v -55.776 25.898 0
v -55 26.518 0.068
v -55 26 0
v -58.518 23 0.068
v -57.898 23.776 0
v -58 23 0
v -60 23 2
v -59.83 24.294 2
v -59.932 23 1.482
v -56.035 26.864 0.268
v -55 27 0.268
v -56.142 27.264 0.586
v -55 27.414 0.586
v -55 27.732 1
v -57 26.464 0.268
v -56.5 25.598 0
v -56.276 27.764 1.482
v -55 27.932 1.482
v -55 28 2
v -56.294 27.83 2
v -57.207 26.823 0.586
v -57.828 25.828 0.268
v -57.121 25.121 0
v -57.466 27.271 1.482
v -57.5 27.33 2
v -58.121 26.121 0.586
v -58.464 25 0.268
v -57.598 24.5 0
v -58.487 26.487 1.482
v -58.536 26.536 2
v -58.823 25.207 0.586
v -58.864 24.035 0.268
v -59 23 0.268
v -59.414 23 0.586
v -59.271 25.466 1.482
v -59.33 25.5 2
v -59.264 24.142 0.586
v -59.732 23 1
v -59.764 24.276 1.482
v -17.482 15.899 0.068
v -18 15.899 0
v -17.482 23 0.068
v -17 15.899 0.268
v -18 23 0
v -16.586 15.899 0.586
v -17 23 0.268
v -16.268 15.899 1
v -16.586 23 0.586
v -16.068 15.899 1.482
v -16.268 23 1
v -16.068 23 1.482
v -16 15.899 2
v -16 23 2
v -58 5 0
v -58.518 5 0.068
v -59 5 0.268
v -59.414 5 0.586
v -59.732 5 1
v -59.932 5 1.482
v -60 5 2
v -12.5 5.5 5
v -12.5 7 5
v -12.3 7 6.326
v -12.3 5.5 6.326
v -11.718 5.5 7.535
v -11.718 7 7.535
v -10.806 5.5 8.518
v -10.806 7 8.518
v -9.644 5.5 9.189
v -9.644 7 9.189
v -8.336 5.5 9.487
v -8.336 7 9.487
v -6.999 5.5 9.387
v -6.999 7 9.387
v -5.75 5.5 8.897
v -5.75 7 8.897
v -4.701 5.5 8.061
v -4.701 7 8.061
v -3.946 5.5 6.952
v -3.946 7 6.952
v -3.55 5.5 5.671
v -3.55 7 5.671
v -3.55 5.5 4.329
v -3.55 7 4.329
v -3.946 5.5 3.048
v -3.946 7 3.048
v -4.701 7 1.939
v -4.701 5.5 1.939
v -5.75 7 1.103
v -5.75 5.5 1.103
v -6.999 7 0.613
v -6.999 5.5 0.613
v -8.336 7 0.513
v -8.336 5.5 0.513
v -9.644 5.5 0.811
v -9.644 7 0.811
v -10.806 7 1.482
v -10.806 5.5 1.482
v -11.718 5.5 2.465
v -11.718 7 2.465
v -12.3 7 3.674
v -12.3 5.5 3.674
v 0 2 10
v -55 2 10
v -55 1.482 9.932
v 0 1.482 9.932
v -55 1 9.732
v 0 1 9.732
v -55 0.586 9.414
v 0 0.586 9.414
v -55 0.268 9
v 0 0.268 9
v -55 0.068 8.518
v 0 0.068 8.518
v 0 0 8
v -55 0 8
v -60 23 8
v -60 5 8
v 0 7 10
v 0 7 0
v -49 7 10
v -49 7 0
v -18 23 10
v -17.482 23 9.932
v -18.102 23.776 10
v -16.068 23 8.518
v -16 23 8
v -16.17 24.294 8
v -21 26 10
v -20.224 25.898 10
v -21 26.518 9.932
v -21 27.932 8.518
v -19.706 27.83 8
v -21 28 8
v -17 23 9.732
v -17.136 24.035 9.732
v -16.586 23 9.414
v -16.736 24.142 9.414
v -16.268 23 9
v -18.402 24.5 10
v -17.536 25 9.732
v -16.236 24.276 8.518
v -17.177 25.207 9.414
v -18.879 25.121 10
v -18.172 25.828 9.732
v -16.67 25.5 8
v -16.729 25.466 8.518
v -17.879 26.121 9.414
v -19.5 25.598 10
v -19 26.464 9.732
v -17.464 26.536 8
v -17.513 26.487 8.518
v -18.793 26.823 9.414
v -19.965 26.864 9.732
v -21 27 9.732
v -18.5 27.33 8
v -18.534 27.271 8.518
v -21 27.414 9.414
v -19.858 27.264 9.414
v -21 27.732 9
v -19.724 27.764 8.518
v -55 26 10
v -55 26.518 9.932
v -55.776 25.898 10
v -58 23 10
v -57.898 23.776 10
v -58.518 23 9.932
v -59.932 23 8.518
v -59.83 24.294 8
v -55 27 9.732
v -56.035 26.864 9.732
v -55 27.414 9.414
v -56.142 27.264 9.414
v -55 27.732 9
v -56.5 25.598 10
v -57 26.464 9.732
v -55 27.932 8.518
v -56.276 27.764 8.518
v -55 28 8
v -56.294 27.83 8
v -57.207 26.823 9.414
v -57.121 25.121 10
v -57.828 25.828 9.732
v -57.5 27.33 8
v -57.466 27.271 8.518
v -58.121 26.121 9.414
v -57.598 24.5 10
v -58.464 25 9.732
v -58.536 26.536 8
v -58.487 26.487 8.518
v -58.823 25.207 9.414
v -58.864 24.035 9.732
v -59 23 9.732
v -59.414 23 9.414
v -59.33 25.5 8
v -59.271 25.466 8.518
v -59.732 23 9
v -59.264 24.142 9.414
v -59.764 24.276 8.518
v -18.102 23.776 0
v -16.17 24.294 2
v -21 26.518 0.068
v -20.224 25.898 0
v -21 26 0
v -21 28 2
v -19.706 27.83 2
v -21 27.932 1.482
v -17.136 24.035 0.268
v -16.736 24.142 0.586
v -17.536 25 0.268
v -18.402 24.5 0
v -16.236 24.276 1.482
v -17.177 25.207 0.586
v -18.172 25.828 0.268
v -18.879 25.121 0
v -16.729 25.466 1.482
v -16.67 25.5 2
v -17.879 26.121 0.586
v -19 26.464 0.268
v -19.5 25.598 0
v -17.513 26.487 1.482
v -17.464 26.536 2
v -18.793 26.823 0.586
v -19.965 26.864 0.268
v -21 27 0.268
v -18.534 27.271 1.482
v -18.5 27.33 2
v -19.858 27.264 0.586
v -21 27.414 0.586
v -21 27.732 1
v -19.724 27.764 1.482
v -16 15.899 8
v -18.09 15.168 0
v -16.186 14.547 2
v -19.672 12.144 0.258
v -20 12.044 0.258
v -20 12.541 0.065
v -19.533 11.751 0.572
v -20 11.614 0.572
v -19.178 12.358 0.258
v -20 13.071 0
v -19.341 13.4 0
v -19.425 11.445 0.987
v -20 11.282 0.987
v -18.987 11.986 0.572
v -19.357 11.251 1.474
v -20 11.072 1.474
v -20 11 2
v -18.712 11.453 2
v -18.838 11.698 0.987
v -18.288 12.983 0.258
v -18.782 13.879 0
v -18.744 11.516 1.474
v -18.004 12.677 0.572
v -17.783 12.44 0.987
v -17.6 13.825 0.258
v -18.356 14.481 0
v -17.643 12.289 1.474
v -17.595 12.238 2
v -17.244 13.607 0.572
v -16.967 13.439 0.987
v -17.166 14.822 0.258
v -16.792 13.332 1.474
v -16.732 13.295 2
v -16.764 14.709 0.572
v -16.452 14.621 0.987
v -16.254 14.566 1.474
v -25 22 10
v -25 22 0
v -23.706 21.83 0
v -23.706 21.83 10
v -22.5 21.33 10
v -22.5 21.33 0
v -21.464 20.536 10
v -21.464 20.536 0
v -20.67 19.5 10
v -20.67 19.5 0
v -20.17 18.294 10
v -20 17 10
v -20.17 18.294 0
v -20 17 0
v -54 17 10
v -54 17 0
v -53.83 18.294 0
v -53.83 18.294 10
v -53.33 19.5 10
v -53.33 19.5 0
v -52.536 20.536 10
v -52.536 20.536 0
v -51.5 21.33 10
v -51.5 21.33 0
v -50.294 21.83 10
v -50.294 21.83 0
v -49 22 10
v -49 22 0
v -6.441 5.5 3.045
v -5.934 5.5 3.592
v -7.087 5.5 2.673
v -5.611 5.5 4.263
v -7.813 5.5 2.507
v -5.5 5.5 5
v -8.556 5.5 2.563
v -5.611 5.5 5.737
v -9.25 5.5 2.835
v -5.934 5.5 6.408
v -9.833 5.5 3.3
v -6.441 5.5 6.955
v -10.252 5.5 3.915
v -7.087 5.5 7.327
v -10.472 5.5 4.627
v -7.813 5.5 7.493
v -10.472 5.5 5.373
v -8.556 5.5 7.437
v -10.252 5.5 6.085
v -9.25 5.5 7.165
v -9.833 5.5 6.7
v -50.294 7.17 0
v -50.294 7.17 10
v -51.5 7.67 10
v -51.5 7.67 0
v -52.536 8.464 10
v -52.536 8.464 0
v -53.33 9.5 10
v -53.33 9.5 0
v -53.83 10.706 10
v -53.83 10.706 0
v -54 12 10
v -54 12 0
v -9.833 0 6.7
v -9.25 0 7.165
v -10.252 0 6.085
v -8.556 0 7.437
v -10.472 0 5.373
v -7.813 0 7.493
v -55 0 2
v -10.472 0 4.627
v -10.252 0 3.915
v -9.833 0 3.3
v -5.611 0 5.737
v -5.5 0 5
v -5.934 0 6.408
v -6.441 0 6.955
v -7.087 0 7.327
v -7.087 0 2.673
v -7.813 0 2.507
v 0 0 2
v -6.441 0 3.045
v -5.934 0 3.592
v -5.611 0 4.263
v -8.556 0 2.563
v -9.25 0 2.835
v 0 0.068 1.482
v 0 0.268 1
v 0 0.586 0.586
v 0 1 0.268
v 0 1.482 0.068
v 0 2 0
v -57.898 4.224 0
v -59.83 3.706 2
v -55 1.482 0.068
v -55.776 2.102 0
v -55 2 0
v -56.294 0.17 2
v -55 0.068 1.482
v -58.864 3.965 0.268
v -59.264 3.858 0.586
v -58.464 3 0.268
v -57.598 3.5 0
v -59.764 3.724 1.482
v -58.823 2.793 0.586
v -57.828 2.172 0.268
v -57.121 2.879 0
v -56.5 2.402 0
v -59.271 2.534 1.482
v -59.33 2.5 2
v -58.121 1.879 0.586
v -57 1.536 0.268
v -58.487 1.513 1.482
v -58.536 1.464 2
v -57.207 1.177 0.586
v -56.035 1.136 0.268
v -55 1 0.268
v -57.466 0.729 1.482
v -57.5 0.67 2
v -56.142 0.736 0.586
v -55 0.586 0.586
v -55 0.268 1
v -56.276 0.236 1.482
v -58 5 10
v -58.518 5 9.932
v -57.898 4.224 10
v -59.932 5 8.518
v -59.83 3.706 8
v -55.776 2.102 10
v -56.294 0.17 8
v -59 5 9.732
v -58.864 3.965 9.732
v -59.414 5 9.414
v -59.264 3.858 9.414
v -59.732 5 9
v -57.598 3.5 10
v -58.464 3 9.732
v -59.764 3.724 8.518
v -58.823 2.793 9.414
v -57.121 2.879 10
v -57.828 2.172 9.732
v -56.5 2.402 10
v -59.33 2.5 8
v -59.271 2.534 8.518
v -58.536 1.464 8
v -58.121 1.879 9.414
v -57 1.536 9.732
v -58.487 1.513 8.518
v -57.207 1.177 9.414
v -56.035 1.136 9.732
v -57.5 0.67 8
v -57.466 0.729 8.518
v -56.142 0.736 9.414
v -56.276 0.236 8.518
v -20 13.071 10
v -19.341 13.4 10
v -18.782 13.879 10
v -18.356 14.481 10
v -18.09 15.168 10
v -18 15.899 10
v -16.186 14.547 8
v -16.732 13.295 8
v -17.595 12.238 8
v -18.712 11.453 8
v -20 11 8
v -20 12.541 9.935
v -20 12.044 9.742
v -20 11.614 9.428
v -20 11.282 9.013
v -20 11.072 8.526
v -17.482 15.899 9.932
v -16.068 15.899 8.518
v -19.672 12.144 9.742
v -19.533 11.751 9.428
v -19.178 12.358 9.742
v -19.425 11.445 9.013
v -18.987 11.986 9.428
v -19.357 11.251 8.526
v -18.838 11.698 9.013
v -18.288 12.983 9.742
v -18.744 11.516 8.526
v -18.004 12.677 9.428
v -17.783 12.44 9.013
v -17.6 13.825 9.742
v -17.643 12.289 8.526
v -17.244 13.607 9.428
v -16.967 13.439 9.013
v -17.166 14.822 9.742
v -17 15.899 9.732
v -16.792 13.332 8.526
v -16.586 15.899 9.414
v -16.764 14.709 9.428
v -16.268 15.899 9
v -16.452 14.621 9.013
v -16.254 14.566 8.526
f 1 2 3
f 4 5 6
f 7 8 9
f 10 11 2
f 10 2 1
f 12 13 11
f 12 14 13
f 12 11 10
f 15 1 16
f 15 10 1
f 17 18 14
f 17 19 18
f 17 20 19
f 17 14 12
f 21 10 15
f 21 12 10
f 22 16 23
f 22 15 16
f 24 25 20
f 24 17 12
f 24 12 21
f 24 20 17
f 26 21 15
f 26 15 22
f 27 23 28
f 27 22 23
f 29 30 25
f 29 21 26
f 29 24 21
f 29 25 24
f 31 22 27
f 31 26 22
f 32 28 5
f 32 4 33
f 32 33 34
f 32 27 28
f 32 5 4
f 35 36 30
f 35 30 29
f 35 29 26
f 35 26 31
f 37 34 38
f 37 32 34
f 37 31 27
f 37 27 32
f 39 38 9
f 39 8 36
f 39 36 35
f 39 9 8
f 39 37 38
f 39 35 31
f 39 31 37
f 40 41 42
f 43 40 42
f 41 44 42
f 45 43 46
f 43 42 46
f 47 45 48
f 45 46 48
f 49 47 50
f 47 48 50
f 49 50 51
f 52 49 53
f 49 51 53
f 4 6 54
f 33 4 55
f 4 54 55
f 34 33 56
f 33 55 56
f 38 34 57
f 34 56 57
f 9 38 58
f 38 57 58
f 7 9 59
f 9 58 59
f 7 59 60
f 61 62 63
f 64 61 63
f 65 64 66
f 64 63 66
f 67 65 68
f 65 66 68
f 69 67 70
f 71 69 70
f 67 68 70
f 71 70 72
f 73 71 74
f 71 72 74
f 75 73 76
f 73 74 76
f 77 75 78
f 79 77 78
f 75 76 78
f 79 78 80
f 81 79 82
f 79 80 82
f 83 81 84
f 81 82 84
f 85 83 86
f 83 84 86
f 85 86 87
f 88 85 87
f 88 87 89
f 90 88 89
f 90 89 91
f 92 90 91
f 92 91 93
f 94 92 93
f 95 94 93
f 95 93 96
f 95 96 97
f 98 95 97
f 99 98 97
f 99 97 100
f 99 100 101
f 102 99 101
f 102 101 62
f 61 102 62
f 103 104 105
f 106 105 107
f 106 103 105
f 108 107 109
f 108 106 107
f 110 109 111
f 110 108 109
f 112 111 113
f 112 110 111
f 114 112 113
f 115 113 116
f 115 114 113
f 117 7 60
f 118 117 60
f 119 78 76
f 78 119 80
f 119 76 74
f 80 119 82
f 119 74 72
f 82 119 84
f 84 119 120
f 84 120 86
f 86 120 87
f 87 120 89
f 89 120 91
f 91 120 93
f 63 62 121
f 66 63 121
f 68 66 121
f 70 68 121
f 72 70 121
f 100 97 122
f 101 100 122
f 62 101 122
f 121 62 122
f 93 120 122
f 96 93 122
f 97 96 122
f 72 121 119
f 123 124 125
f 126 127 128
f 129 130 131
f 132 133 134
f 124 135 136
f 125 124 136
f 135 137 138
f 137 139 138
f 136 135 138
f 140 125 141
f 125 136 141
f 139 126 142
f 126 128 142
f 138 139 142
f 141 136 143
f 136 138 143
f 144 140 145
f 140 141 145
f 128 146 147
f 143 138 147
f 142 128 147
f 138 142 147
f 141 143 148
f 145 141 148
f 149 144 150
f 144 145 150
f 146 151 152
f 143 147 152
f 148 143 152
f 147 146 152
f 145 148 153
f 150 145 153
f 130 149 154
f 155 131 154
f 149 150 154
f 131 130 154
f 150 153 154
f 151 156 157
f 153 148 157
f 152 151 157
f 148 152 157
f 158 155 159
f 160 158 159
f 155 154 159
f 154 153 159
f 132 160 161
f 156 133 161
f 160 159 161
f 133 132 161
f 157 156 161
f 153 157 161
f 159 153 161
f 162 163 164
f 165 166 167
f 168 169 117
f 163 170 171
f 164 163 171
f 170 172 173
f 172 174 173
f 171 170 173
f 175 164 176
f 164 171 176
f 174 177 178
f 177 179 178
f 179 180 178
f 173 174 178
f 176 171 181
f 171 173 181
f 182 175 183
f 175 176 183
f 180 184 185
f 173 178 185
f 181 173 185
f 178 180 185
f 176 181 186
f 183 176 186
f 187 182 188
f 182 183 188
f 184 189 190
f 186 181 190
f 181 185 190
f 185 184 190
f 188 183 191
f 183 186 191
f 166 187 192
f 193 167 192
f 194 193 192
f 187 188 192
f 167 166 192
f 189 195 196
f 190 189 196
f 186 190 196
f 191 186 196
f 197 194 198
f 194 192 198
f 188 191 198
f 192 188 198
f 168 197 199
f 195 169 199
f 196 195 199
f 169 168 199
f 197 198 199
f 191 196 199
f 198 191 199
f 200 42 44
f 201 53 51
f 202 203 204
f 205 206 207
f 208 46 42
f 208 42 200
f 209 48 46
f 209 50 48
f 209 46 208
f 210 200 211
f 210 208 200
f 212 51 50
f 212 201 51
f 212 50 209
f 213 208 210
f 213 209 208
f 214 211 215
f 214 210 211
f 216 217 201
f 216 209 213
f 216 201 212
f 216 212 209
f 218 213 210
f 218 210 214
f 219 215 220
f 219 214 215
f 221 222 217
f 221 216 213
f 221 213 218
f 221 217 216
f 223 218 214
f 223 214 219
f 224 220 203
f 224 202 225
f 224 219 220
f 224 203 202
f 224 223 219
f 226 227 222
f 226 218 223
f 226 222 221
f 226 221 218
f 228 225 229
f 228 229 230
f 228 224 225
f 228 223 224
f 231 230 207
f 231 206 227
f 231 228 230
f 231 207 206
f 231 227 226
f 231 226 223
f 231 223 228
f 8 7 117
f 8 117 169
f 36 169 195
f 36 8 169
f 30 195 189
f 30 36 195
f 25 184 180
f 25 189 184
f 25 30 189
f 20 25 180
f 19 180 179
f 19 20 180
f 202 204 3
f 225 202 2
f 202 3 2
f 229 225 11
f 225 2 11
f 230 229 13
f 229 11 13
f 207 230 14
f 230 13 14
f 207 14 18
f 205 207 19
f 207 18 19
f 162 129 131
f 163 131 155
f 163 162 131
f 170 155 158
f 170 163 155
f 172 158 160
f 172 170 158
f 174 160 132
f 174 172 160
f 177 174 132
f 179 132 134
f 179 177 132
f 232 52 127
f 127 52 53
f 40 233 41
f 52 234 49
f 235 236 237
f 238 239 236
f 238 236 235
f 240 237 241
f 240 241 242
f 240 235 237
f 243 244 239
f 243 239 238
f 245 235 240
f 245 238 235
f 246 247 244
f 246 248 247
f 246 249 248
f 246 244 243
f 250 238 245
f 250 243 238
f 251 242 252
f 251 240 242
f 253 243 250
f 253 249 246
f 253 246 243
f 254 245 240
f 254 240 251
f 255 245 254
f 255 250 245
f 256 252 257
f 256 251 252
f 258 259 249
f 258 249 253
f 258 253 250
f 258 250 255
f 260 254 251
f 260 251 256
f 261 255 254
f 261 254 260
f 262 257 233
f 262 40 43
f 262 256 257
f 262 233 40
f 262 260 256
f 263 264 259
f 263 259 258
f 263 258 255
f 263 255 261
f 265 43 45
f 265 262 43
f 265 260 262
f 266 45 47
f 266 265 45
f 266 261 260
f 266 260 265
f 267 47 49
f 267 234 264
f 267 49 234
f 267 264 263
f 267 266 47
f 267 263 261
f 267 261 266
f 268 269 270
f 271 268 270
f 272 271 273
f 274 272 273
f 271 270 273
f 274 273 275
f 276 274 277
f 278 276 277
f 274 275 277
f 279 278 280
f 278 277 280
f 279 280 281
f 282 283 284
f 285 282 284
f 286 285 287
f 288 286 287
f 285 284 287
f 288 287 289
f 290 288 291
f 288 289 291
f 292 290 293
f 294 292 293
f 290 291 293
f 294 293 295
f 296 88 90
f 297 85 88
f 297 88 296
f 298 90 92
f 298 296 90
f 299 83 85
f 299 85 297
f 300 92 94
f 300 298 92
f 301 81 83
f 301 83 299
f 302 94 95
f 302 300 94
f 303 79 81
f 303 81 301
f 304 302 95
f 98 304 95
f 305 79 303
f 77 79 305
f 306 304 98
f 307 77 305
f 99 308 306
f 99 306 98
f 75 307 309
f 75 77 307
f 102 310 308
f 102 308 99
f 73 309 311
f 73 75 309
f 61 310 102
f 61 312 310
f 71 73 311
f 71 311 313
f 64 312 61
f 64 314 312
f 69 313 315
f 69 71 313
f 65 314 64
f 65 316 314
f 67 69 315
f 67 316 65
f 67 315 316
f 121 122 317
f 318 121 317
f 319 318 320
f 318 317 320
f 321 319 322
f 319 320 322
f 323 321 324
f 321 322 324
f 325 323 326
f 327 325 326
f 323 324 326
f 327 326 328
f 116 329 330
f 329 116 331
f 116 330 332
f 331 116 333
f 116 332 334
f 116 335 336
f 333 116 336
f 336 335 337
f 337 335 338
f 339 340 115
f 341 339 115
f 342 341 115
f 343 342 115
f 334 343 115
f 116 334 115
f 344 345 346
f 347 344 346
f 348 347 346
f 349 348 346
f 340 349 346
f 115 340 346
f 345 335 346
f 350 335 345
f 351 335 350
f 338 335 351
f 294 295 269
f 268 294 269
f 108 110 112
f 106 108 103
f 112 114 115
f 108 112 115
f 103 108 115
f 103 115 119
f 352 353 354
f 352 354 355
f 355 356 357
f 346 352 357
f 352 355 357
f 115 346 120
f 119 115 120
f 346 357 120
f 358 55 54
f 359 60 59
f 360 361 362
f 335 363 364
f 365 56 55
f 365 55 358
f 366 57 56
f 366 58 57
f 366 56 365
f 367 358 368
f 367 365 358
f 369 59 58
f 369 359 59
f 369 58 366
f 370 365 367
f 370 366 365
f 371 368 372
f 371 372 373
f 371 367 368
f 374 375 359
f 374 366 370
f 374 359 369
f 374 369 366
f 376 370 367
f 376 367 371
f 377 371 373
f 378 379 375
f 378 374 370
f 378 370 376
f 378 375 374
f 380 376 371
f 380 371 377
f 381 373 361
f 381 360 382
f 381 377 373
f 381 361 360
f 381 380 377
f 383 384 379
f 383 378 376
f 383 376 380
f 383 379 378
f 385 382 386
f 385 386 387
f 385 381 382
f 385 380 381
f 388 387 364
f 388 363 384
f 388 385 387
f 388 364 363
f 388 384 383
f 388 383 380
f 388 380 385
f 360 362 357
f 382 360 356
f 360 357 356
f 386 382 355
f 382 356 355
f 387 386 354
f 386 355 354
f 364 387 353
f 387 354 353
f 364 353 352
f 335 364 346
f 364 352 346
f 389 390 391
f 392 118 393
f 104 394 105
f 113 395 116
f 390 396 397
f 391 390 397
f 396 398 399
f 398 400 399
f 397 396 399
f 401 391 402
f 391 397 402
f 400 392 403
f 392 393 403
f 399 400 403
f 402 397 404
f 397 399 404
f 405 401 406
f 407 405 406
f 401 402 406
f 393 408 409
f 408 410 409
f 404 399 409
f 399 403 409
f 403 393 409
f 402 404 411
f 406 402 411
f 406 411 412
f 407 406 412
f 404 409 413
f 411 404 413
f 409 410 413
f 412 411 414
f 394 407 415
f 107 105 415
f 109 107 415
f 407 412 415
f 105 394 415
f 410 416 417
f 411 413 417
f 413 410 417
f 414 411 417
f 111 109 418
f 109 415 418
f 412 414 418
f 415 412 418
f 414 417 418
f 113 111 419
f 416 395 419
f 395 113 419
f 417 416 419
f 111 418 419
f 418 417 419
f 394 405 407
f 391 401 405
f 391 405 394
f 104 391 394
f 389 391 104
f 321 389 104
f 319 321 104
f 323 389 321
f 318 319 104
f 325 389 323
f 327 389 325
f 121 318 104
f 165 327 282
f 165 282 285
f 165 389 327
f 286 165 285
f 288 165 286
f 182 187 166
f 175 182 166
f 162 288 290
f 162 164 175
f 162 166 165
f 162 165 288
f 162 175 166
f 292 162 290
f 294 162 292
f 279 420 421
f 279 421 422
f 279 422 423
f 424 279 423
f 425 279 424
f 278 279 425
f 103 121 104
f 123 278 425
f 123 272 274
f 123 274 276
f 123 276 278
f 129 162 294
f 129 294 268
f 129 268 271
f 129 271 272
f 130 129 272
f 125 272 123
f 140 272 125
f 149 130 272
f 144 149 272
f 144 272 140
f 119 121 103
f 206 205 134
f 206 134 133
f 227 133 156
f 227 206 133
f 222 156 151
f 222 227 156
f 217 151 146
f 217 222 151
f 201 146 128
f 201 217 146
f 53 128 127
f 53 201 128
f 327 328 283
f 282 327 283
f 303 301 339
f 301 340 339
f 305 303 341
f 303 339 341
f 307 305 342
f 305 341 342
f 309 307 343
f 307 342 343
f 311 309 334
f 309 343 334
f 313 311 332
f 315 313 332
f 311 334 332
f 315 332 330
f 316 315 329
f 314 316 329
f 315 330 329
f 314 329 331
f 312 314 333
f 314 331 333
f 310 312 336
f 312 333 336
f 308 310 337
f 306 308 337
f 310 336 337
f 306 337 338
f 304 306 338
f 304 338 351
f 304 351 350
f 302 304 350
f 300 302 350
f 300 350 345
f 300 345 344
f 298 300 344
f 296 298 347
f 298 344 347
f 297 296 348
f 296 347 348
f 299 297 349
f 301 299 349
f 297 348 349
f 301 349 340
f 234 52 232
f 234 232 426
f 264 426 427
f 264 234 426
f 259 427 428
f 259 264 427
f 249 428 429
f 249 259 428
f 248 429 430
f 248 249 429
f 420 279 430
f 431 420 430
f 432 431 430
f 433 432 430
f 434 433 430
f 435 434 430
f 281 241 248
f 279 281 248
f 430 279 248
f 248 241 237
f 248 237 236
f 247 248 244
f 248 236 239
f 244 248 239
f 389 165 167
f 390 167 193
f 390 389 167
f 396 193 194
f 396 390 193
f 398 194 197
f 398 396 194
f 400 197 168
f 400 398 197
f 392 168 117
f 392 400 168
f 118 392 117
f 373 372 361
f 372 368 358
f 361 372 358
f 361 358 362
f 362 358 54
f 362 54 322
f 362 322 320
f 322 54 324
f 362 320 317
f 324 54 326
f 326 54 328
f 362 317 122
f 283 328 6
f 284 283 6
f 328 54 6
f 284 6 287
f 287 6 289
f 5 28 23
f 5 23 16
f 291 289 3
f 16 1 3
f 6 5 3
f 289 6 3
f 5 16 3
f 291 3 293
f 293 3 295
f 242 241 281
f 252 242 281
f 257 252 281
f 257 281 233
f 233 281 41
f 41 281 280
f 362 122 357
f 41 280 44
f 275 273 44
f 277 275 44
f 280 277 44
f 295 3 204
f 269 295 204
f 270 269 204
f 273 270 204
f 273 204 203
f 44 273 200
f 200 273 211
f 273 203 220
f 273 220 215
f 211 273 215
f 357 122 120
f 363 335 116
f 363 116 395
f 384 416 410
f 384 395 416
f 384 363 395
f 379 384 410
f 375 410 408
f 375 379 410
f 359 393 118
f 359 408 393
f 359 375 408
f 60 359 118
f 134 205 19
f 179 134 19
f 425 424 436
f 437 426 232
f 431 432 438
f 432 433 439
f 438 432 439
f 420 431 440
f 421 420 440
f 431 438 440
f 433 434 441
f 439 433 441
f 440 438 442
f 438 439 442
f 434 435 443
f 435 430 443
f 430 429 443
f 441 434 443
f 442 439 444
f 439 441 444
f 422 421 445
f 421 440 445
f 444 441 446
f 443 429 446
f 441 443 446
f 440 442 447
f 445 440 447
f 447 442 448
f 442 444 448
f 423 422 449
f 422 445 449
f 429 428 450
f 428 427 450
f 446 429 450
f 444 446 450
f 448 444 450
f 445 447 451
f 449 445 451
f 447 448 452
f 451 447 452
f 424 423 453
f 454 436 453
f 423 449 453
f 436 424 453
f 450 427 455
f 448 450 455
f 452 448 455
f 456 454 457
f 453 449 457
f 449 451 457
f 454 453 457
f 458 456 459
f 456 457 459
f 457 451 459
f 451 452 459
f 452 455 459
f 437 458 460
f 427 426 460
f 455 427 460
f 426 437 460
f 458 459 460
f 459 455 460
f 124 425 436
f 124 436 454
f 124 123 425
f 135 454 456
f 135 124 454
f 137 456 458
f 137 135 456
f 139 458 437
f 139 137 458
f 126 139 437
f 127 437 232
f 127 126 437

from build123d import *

# Parameters (mm, degrees)
F1_DEPTH       = 10
F3_D           = 5
F3_CBORE_D     = 9
F3_CBORE_DEPTH = 1.5
F4_T1_DEPTH    = 10
F4_T3_DEPTH    = 10
F4_T5_DEPTH    = 10
F4_T7_DEPTH    = 35
F4_T9_DEPTH    = 35
F4_T11_DEPTH   = 35
F4_T13_DEPTH   = 34.4948974279
F5_R           = 2


# Not quite as in the source:
# - a fillet or chamfer that OpenCascade refuses, or shapes differently, is made with other operations: its cross-section is extruded or revolved along the edge and cut away or added


with BuildPart() as f1:
    # F0 (on Top) → F1 (new body)
    with BuildSketch(Plane.XY):
        Polygon((-60, 0), (0, 0), (0, 7), (-54, 7), (-54, 22), (-20, 22), (-20, 11), (-16, 11), (-16, 28), (-60, 28), align=None)
    extrude(amount=F1_DEPTH)

    # F3 (through all)
    with Locations(Plane(origin=(0, 7, 0), x_dir=(-1, 0, 0), z_dir=(0, 1, 0))):
        with Locations((8, 5)):
            CounterBoreHole(F3_D / 2, F3_CBORE_D / 2, F3_CBORE_DEPTH)

    # F4: fillet of radius 5 on 7 edges, made by hand

    # F4_s2 → F4_t1 (join)
    with BuildSketch(Plane.XY):
        with BuildLine():
            ThreePointArc((-49, 7), (-52.5355339059, 8.4644660941), (-54, 12))
            Line((-54, 12), (-54, 7))
            Line((-54, 7), (-49, 7))
        make_face()
    extrude(amount=F4_T1_DEPTH)

    # F4_s4 → F4_t3 (join)
    with BuildSketch(Plane.XY):
        with BuildLine():
            ThreePointArc((-54, 17), (-52.5355339059, 20.5355339059), (-49, 22))
            Line((-49, 22), (-54, 22))
            Line((-54, 22), (-54, 17))
        make_face()
    extrude(amount=F4_T3_DEPTH)

    # F4_s6 → F4_t5 (join)
    with BuildSketch(Plane.XY):
        with BuildLine():
            ThreePointArc((-25, 22), (-21.4644660941, 20.5355339059), (-20, 17))
            Line((-20, 17), (-20, 22))
            Line((-20, 22), (-25, 22))
        make_face()
    extrude(amount=F4_T5_DEPTH)

    # F4_s8 → F4_t7 (cut)
    with BuildSketch(Plane.XY.offset(-12.5)):
        with BuildLine():
            ThreePointArc((-55, 0), (-58.5355339059, 1.4644660941), (-60, 5))
            Line((-60, 5), (-60, 0))
            Line((-60, 0), (-55, 0))
        make_face()
    extrude(amount=F4_T7_DEPTH, mode=Mode.SUBTRACT)

    # F4_s10 → F4_t9 (cut)
    with BuildSketch(Plane.XY.offset(-12.5)):
        with BuildLine():
            ThreePointArc((-60, 23), (-58.5355339059, 26.5355339059), (-55, 28))
            Line((-55, 28), (-60, 28))
            Line((-60, 28), (-60, 23))
        make_face()
    extrude(amount=F4_T9_DEPTH, mode=Mode.SUBTRACT)

    # F4_s12 → F4_t11 (cut)
    with BuildSketch(Plane.XY.offset(-12.5)):
        with BuildLine():
            ThreePointArc((-21, 28), (-17.4644660941, 26.5355339059), (-16, 23))
            Line((-16, 23), (-16, 28))
            Line((-16, 28), (-21, 28))
        make_face()
    extrude(amount=F4_T11_DEPTH, mode=Mode.SUBTRACT)

    # F4_s14 → F4_t13 (cut)
    with BuildSketch(Plane.XY.offset(-12.2474487139)):
        with BuildLine():
            ThreePointArc((-16, 15.8989794856), (-17.1270166538, 12.7367018254), (-20, 11))
            Line((-20, 11), (-16, 11))
            Line((-16, 11), (-16, 15.8989794856))
        make_face()
    extrude(amount=F4_T13_DEPTH, mode=Mode.SUBTRACT)

    # F5
    f5_edges = [f1.edges().sort_by_distance(p)[0] for p in [
        (-38, 28, 0),
        (-55, 28, 5),
        (-38, 28, 10),
        (-21, 28, 5),
        (-16, 19.44949, 0),
        (-16, 19.44949, 10),
        (-60, 14, 0),
        (-60, 14, 10),
        (-27.5, 0, 0),
        (-27.5, 0, 10),
        (-58.535534, 1.464466, 0),
        (-58.535534, 26.535534, 0),
        (-17.464466, 26.535534, 0),
        (-17.127017, 12.736702, 0),
        (-58.535534, 1.464466, 10),
        (-58.535534, 26.535534, 10),
        (-17.464466, 26.535534, 10),
        (-17.127017, 12.736702, 10),
    ]]
    fillet(f5_edges, radius=F5_R)


solid = f1.part
